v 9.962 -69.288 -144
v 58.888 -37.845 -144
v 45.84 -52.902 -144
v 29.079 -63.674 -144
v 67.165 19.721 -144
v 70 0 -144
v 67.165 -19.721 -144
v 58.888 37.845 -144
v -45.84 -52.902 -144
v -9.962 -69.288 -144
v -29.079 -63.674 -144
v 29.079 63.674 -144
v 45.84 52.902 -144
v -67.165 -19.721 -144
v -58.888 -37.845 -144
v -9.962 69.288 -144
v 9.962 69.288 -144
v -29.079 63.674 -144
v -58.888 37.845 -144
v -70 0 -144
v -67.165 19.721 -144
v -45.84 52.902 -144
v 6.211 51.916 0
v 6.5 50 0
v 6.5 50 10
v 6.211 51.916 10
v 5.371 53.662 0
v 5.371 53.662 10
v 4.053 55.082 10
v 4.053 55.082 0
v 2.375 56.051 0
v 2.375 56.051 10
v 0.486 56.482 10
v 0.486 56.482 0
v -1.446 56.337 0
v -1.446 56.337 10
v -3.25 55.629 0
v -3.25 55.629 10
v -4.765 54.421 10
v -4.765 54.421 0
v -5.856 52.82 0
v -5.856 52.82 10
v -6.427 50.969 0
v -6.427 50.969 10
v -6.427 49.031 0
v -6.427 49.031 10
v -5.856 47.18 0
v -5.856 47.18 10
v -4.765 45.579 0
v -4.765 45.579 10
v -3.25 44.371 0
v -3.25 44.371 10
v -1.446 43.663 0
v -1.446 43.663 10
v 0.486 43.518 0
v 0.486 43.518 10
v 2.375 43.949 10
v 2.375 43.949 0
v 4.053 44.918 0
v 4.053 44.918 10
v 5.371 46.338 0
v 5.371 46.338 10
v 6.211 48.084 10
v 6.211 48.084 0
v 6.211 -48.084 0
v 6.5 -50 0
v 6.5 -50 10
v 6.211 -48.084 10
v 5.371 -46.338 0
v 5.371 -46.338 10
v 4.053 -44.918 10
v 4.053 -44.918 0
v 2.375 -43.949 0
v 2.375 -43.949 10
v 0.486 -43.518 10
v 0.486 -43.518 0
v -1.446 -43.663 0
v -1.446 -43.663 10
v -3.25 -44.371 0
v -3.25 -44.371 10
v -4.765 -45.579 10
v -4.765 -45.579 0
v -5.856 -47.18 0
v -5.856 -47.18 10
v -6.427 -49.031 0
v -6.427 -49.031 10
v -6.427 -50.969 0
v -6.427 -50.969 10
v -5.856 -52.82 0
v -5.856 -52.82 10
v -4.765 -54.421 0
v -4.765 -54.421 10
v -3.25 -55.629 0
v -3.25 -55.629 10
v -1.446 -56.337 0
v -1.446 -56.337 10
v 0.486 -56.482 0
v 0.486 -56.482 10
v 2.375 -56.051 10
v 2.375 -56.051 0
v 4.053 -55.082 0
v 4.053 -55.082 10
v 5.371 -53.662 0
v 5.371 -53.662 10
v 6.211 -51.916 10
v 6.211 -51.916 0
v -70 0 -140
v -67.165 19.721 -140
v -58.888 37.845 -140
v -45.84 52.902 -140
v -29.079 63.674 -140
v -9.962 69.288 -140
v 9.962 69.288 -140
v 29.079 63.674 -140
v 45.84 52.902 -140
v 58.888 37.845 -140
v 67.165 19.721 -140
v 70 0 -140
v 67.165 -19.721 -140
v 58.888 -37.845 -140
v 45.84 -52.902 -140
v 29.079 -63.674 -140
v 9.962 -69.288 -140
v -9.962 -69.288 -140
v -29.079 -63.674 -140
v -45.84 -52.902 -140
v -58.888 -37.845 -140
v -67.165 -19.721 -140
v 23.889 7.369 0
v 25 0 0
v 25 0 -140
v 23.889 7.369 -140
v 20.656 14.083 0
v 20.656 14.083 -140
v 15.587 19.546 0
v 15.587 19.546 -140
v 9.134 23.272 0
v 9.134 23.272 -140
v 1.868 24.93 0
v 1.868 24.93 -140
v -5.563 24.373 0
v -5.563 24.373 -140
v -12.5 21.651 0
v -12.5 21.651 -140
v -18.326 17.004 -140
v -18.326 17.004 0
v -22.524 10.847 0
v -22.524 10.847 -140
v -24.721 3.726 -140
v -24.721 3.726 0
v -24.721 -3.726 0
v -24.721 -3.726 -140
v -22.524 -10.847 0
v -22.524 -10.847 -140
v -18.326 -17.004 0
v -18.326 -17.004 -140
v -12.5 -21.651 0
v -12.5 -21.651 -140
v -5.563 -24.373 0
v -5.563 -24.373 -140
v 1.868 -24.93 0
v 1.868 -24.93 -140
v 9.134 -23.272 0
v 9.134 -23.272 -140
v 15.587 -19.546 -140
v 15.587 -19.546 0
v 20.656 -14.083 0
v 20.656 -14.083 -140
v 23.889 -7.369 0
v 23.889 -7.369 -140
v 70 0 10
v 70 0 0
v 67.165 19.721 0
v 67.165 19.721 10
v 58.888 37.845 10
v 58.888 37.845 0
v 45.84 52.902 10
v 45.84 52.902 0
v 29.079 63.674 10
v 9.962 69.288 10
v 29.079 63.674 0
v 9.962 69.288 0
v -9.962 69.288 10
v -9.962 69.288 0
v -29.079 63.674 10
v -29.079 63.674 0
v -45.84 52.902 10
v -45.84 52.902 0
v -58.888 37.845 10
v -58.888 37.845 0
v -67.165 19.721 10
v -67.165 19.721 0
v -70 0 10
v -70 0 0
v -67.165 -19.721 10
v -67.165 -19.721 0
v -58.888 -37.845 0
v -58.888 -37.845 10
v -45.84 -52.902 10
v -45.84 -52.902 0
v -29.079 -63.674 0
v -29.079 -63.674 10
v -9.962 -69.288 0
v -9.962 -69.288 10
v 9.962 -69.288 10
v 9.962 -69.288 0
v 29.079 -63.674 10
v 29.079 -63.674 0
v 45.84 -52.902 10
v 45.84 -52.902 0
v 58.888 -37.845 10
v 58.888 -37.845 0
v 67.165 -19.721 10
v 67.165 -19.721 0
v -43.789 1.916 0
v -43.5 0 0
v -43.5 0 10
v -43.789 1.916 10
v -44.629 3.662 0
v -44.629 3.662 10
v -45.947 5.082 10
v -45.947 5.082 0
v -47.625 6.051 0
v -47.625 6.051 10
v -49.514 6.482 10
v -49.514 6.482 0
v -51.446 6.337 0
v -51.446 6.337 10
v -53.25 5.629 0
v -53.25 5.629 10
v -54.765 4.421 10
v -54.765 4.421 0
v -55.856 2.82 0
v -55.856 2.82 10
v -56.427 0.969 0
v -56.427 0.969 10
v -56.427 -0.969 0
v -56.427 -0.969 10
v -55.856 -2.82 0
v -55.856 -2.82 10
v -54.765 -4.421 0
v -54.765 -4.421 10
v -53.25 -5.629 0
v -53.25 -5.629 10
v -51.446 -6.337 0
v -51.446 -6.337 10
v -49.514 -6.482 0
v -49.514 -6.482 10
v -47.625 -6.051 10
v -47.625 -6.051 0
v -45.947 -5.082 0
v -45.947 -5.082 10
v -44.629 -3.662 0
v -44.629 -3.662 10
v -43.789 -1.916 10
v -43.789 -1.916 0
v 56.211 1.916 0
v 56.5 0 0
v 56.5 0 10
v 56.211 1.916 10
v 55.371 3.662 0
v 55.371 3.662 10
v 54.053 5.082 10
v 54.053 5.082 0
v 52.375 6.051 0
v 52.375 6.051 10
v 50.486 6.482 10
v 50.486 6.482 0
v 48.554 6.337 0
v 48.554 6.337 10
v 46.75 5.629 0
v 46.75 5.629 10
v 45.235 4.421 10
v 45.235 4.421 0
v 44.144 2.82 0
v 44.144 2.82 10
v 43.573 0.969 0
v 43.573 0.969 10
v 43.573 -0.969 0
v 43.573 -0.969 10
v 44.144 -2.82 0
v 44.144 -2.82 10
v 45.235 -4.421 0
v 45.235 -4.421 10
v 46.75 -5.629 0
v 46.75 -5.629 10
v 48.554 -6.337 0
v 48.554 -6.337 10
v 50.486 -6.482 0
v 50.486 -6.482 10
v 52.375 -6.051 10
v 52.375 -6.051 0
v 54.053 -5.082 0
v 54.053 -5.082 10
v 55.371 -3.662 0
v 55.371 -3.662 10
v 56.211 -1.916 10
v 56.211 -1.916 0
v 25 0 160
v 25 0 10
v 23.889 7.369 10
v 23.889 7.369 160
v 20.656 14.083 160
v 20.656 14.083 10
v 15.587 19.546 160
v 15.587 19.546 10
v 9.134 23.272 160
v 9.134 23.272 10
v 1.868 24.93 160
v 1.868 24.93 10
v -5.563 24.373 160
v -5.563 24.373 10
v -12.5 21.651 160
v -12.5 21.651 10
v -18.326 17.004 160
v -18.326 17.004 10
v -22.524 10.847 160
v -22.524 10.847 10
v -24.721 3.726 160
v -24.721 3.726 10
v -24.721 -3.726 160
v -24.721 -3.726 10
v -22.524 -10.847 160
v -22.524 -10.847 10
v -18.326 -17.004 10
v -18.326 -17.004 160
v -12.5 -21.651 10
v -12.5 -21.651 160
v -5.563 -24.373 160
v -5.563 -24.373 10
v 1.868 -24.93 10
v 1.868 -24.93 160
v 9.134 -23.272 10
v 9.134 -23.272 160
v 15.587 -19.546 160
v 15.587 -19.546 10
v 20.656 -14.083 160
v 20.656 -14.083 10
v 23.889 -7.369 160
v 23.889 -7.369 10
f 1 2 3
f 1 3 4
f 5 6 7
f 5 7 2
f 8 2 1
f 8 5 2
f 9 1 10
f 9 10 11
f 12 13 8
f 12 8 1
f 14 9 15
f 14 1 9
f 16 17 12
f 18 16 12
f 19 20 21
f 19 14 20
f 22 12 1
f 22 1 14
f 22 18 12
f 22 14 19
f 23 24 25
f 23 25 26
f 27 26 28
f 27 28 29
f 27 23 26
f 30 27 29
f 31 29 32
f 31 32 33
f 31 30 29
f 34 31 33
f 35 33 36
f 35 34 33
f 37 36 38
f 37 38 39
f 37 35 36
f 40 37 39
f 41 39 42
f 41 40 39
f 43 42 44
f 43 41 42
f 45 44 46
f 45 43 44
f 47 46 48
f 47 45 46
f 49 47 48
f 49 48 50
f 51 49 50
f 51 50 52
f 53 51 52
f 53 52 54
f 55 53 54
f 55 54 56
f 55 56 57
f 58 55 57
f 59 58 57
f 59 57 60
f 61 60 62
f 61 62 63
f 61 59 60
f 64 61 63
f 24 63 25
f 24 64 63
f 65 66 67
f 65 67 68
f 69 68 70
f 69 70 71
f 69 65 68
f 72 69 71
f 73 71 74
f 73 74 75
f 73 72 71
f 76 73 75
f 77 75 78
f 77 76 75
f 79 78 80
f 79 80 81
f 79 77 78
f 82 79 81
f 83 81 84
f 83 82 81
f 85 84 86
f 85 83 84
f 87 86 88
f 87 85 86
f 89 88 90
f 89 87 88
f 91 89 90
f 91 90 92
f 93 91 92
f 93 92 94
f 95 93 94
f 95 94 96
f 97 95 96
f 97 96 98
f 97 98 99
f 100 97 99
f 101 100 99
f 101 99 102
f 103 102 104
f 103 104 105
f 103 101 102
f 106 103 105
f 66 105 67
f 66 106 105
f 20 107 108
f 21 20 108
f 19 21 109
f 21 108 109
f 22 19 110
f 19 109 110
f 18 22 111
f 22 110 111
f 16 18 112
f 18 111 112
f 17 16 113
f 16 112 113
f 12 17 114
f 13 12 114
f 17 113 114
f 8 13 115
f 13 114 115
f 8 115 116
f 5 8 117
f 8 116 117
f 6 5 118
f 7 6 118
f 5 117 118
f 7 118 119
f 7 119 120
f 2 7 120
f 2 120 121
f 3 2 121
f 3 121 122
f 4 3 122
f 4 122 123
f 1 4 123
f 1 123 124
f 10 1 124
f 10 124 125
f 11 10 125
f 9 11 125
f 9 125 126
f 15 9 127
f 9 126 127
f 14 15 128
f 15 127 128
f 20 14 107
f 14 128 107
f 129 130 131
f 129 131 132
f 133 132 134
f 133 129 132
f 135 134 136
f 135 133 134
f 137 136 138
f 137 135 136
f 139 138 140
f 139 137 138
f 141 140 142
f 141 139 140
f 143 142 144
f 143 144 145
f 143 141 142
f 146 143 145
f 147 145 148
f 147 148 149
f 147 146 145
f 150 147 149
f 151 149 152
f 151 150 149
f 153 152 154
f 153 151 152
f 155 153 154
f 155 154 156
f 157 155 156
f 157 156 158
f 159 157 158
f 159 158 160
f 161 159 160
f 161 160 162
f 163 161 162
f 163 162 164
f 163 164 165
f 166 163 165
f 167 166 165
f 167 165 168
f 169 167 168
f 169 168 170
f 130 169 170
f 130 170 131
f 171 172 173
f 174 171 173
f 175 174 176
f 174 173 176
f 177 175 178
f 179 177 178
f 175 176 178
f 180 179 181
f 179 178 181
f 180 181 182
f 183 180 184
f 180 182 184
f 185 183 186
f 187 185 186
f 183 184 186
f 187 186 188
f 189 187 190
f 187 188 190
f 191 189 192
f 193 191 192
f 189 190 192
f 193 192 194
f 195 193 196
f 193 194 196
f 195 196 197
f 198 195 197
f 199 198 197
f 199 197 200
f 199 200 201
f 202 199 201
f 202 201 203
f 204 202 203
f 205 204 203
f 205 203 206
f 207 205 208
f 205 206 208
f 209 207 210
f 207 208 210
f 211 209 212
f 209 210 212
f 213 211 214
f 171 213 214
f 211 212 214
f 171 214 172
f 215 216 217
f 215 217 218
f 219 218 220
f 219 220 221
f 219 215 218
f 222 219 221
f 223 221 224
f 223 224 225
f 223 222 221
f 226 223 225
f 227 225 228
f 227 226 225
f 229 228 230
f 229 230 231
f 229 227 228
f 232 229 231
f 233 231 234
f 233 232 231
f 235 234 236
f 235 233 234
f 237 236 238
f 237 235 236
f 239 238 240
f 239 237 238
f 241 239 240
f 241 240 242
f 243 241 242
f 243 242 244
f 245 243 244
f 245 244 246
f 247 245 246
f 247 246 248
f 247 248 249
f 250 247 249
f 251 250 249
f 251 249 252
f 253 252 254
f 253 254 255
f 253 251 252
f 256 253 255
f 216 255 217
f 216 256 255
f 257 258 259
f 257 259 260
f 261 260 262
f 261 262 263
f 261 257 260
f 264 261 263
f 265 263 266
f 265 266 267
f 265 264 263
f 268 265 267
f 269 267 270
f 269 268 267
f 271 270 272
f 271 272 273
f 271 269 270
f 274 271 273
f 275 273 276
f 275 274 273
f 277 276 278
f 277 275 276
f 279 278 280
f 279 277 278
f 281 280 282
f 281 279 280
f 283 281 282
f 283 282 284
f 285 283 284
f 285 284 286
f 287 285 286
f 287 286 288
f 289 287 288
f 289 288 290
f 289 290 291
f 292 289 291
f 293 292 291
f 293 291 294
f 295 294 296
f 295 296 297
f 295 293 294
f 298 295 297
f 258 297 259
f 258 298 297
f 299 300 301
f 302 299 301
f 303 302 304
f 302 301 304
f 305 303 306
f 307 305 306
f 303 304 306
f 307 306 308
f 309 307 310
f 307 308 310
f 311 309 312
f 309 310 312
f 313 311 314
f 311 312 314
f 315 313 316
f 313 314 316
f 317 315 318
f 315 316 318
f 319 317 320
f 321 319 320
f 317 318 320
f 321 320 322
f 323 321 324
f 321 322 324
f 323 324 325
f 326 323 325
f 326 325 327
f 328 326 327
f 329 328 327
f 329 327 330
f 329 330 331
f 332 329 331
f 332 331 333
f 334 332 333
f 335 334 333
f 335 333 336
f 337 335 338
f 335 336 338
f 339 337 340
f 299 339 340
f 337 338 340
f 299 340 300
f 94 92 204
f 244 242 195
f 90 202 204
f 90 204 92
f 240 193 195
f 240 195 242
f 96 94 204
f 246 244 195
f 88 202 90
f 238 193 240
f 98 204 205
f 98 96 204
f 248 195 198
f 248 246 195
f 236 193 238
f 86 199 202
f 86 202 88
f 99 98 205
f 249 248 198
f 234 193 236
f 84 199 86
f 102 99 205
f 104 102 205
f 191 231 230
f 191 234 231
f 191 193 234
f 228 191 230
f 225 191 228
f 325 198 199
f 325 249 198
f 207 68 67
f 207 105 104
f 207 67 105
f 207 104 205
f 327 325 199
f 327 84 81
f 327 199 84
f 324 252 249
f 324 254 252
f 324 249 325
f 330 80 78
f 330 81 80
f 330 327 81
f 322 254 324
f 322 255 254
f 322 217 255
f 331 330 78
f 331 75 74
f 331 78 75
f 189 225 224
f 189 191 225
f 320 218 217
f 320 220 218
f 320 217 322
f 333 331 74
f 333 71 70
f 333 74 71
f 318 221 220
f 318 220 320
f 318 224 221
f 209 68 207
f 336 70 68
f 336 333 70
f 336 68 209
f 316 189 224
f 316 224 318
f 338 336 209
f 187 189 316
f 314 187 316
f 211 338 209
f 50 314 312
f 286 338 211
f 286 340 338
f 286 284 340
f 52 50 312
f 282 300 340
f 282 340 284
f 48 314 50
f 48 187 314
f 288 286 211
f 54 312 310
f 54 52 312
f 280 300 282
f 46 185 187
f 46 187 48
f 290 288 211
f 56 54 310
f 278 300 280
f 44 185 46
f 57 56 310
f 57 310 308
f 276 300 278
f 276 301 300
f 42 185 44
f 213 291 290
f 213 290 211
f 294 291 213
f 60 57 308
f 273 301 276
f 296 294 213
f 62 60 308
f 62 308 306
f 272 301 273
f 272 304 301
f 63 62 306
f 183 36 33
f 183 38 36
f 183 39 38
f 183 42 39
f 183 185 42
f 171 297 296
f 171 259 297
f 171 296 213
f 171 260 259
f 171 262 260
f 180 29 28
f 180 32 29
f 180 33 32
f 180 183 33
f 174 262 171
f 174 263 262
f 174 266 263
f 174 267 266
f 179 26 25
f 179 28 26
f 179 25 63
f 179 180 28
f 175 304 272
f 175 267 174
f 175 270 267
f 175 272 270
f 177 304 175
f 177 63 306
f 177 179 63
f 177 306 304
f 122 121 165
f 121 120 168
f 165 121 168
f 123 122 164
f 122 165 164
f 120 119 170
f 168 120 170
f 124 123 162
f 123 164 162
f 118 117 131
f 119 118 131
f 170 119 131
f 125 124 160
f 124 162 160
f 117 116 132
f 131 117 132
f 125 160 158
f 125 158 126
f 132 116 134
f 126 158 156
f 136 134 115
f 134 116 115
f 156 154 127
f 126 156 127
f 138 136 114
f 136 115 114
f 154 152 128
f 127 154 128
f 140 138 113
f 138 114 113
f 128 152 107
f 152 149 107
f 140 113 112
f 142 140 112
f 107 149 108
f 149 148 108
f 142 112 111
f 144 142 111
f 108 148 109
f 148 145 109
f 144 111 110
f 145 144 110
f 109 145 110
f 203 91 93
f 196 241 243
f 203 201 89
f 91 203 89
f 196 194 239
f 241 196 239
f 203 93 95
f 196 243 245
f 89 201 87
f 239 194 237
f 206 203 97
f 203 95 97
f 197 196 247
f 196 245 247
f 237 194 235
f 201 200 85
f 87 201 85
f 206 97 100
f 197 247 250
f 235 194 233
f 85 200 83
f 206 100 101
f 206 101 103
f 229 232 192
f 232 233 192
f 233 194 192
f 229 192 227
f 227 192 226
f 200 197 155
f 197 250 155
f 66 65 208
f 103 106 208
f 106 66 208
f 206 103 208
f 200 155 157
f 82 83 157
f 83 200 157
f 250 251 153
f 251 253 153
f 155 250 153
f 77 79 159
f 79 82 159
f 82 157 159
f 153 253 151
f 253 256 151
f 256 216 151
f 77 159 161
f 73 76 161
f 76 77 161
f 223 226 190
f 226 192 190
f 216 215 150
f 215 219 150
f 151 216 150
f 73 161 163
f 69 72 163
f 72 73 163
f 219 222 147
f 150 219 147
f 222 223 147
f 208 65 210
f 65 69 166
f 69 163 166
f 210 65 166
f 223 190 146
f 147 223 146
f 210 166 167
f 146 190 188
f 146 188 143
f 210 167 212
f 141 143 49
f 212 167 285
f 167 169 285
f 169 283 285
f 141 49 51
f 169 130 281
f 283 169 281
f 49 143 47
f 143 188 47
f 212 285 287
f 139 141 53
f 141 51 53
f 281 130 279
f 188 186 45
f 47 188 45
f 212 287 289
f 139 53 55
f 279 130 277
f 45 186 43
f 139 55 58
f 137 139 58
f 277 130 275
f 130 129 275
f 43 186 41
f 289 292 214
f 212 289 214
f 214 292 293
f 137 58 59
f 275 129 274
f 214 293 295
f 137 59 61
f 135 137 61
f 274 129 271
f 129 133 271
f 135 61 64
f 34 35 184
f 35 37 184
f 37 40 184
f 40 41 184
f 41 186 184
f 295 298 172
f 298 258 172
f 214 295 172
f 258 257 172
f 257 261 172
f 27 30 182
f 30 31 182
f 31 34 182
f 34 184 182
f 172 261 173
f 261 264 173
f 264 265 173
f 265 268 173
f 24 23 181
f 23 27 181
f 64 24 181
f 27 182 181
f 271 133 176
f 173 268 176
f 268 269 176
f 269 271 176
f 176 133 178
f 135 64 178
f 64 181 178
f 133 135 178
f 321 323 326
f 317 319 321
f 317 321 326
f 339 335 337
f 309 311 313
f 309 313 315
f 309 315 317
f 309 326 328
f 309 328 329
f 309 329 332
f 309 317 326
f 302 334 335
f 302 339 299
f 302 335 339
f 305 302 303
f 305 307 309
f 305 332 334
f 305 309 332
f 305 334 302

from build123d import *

# Parameters (mm, degrees)
SKETCH1_R                = 70
SKETCH1_R_2              = 6.5
BOSS_EXTRUDE1_DEPTH      = 10
SKETCH2_R                = 25
BOSS_EXTRUDE2_DEPTH      = 150
BOSS_EXTRUDE2_DEPTH_BACK = 150
SKETCH3_R                = 70
BOSS_EXTRUDE3_DEPTH      = 4


with BuildPart() as part:
    # Sketch1 → Boss-Extrude1 (new body)
    with BuildSketch(Plane.XY):
        Circle(SKETCH1_R)
        with Locations((0, 50)):
            Circle(SKETCH1_R_2, mode=Mode.SUBTRACT)
        with Locations((50, 0)):
            Circle(SKETCH1_R_2, mode=Mode.SUBTRACT)
        with Locations((0, -50)):
            Circle(SKETCH1_R_2, mode=Mode.SUBTRACT)
        with Locations((-50, 0)):
            Circle(SKETCH1_R_2, mode=Mode.SUBTRACT)
    extrude(amount=BOSS_EXTRUDE1_DEPTH)

    # Sketch2 → Boss-Extrude2 (add, two sides)
    with BuildSketch(Plane.XY.offset(10)) as boss_extrude2_sk:
        Circle(SKETCH2_R)
    extrude(amount=BOSS_EXTRUDE2_DEPTH)
    extrude(boss_extrude2_sk.sketch, amount=-BOSS_EXTRUDE2_DEPTH_BACK)

    # Sketch3 → Boss-Extrude3 (add)
    with BuildSketch(Plane(origin=(0, 0, -140), x_dir=(-1, 0, 0), z_dir=(0, 0, -1))):
        Circle(SKETCH3_R)
    extrude(amount=BOSS_EXTRUDE3_DEPTH)


solid = part.part
